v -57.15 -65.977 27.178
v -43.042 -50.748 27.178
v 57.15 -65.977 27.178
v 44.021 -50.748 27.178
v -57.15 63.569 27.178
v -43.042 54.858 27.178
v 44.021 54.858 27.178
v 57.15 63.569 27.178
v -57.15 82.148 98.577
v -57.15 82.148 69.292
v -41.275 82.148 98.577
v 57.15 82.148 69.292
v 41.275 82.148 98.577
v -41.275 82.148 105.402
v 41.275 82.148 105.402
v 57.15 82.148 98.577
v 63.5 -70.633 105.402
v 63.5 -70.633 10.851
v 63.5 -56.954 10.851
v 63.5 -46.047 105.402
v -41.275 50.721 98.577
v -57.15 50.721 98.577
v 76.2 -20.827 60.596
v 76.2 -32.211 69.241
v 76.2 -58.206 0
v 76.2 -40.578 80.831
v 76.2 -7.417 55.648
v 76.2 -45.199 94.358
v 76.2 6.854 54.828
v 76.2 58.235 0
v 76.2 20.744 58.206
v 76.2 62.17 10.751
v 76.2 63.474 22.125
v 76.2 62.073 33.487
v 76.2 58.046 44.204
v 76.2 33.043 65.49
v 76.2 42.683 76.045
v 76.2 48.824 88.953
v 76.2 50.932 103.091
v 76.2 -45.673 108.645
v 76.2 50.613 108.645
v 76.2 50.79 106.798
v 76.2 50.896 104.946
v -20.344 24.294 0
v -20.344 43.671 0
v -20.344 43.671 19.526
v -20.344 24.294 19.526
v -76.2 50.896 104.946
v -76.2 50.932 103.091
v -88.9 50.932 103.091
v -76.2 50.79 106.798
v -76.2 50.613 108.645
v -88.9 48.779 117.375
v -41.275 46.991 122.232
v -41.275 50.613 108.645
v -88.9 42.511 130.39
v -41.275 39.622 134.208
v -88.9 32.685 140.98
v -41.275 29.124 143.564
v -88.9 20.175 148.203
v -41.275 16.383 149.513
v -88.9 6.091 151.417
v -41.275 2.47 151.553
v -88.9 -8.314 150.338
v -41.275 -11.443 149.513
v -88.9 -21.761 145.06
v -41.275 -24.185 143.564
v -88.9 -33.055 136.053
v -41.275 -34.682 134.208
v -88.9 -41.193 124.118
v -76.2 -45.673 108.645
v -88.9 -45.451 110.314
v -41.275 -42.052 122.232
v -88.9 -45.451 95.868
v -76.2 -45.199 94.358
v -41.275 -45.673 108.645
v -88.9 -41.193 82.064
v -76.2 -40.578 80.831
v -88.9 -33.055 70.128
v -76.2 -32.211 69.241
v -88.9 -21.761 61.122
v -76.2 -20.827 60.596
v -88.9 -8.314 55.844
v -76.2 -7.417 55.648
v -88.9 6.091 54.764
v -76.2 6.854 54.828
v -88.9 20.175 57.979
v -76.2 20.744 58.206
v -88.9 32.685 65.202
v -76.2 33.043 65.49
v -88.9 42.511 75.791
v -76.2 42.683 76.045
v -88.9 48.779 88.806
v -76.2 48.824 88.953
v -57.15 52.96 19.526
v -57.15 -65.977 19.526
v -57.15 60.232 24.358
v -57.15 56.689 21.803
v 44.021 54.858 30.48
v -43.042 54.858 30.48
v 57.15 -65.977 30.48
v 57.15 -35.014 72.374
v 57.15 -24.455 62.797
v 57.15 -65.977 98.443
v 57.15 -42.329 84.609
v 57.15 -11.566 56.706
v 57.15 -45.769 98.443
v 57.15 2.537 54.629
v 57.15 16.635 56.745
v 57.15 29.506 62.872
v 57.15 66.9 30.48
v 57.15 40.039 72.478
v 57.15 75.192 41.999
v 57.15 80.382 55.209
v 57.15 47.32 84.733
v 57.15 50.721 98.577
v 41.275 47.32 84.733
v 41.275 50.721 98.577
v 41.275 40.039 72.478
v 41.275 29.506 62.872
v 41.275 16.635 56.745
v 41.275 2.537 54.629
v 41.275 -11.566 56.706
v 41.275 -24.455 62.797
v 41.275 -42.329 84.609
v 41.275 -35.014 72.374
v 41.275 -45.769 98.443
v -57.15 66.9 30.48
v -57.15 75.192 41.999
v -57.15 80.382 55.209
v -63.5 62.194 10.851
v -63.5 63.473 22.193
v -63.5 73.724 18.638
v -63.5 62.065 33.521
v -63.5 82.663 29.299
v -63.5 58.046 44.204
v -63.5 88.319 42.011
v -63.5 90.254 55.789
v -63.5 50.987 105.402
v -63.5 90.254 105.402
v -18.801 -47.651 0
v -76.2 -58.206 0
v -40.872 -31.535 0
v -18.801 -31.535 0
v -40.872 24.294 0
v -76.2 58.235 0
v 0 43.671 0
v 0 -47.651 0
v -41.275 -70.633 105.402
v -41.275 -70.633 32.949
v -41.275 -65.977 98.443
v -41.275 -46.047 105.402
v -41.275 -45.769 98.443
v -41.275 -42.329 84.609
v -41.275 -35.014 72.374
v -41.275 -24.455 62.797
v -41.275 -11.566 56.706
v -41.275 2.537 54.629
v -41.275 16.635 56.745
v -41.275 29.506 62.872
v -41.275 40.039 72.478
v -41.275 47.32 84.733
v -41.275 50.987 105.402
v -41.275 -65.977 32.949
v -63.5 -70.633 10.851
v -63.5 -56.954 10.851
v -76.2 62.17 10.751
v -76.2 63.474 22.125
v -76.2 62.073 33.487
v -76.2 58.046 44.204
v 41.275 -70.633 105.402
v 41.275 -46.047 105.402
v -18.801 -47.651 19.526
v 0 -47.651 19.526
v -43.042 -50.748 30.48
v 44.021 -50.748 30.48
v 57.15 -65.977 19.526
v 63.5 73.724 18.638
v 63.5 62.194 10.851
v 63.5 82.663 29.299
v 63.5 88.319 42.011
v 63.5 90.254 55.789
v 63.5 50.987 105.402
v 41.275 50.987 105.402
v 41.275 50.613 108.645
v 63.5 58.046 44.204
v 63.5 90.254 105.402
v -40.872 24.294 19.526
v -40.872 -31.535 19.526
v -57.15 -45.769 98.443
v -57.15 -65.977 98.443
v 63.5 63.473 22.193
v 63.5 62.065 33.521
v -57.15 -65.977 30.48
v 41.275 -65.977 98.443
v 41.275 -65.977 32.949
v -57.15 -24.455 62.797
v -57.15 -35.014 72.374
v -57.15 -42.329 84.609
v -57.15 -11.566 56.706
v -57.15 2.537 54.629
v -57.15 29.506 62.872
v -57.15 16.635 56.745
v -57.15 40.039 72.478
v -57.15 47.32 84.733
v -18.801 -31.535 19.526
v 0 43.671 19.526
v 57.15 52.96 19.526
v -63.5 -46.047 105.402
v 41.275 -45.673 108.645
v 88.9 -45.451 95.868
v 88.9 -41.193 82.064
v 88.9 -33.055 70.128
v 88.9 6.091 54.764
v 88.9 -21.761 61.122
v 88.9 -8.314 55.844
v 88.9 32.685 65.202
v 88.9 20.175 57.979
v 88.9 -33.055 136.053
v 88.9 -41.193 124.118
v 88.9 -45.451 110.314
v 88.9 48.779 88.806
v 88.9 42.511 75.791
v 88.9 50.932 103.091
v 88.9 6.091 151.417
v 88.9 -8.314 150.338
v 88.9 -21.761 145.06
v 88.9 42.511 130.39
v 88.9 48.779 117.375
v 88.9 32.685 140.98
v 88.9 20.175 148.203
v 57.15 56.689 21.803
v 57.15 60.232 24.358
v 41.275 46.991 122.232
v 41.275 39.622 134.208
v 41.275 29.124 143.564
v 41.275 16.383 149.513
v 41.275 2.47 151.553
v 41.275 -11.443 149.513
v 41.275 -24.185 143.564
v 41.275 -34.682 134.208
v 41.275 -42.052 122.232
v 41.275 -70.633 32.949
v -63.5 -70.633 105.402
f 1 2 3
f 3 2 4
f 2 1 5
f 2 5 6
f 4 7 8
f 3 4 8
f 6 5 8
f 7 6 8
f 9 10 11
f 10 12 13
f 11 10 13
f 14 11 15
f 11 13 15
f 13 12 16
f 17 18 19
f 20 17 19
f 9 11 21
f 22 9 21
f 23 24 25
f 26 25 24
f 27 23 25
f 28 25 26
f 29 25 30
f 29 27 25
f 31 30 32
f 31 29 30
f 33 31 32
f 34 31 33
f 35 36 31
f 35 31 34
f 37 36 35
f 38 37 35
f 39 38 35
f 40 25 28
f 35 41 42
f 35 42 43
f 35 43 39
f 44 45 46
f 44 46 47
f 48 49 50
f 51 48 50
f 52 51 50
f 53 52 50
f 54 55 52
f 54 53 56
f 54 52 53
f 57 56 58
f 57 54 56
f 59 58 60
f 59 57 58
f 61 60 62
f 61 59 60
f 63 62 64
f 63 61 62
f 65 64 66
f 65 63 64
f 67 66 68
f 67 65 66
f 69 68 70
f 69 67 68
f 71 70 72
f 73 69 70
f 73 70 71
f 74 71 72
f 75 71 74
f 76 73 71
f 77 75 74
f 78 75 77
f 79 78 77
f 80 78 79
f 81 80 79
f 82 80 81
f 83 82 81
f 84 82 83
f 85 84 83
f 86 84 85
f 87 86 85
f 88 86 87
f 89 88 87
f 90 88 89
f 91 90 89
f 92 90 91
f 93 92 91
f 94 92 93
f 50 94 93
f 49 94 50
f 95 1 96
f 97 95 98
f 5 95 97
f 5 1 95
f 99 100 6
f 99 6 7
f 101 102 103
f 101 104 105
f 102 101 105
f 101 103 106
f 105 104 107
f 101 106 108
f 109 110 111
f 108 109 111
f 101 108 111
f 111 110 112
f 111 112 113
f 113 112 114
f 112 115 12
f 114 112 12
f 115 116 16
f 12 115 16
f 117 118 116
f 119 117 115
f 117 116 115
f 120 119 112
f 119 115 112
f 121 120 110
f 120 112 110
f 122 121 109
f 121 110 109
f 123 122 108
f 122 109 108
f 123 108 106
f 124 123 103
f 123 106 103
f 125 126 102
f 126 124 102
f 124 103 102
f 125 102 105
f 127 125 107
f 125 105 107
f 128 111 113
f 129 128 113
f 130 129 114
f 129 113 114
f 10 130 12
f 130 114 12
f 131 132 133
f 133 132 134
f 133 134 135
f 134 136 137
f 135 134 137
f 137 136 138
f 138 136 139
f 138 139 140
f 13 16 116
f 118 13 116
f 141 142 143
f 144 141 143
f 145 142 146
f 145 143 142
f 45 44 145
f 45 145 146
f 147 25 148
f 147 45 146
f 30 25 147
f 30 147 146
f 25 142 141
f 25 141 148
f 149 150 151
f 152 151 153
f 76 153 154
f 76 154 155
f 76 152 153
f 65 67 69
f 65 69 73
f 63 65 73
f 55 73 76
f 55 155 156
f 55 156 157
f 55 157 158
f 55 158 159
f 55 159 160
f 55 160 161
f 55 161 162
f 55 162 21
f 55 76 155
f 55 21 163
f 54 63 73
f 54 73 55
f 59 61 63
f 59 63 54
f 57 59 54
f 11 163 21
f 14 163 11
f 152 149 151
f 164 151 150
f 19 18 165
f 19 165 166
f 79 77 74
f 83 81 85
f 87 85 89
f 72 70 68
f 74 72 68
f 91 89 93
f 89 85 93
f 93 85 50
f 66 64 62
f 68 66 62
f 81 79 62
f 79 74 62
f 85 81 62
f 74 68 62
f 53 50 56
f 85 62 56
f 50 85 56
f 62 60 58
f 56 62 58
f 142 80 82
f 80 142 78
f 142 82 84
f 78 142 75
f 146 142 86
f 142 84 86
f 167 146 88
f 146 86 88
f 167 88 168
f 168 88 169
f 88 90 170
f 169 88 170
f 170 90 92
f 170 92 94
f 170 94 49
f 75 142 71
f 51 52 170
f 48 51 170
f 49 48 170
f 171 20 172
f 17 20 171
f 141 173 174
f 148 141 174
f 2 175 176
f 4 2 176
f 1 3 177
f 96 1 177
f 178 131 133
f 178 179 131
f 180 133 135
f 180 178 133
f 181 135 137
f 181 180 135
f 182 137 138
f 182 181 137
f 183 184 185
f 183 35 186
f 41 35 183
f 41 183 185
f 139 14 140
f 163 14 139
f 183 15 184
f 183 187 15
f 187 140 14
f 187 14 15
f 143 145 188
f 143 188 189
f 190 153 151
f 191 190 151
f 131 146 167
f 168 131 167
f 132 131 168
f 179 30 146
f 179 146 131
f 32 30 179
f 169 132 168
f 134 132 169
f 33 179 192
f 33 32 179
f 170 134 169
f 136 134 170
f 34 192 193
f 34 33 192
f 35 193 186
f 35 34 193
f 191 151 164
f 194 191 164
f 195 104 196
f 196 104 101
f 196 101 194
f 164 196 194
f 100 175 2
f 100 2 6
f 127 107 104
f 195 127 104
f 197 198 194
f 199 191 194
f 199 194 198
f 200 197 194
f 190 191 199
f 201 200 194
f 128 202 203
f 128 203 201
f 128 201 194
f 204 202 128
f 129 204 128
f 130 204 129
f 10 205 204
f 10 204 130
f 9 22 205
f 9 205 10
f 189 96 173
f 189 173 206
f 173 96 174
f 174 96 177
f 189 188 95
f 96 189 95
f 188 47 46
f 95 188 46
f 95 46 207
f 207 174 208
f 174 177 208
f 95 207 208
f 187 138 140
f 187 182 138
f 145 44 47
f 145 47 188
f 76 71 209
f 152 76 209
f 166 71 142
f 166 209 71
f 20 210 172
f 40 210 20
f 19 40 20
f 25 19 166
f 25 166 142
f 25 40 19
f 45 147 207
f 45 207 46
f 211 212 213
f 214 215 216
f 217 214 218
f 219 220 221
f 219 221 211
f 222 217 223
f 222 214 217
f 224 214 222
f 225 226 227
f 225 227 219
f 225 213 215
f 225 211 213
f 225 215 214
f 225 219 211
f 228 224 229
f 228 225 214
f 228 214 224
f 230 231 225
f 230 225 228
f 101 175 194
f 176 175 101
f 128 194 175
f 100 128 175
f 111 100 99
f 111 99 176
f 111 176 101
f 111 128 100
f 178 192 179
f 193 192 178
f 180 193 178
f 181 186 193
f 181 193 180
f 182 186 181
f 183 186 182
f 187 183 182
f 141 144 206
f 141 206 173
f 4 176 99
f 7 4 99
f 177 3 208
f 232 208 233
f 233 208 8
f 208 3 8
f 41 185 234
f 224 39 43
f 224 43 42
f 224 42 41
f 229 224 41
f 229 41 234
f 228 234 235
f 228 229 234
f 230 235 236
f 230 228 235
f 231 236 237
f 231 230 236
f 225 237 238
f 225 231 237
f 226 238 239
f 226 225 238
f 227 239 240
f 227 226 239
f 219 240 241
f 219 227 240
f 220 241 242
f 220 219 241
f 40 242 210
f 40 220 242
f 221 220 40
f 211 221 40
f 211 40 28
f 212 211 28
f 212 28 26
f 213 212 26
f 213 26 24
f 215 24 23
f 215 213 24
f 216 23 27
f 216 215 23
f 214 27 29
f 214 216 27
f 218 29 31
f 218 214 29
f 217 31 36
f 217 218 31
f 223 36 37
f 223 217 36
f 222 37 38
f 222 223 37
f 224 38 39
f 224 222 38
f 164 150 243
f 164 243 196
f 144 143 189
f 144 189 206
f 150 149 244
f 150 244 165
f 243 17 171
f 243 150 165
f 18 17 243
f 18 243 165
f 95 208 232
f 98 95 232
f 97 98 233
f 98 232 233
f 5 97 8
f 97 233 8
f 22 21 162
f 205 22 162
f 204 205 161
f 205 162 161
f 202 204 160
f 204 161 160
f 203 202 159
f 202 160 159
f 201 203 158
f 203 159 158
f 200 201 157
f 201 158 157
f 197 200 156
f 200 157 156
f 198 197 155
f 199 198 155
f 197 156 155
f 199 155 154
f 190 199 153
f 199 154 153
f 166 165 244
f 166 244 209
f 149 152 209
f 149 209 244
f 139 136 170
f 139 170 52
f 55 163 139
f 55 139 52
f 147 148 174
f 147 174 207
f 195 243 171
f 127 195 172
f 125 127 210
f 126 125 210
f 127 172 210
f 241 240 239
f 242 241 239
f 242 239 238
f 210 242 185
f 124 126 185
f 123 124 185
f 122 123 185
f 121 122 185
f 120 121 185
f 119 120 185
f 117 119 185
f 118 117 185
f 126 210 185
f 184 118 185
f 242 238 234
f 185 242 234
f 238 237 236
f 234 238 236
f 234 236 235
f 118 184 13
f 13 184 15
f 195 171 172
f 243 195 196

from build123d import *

# Parameters (mm, degrees)
F1_DEPTH  = 76.2
F2_R      = 48.462003
F3_DEPTH  = 88.9
F5_DEPTH  = 63.5
F7_DEPTH  = 41.275
F9_DEPTH  = 57.15
F11_W     = 122.617453
F11_H     = 143.214412
F11_W_2   = 87.062612
F11_H_2   = 105.60561
F12_DEPTH = 3.302
F14_DEPTH = 25.4


with BuildPart() as f1:
    # F0 (on Right) → F1 (new body, symmetric)
    with BuildSketch(Plane.YZ):
        with BuildLine():
            Line((-45.672867, 108.644605), (-58.206145, 0))
            Line((-58.206145, 0), (58.235409, 0))
            ThreePointArc((58.235409, 0), (63.473631, 22.12486), (58.046448, 44.204128))
            Line((58.046448, 44.204128), (50.612573, 108.644605))
            ThreePointArc((50.612573, 108.644605), (2.469853, 151.552848), (-45.672867, 108.644605))
        make_face()
    extrude(amount=F1_DEPTH, both=True)

    # F2 (on Right) → F3 (join, symmetric)
    with BuildSketch(Plane.YZ):
        with Locations((2.469853, 103.090845)):
            Circle(F2_R)
    extrude(amount=F3_DEPTH, both=True)

    # F4 (on Right) → F5 (join, symmetric)
    with BuildSketch(Plane.YZ):
        with BuildLine():
            Line((90.254351, 105.402268), (-70.632874, 105.402268))
            Line((-70.632874, 105.402268), (-70.632874, 10.851024))
            Line((-70.632874, 10.851024), (62.193779, 10.851024))
            ThreePointArc((62.193779, 10.851024), (82.663095, 29.299382), (90.254351, 55.789147))
            Line((90.254351, 55.789147), (90.254351, 105.402268))
        make_face()
    extrude(amount=F5_DEPTH, both=True)

    # F6 (on Right) → F7 (cut, symmetric)
    with BuildSketch(Plane.YZ):
        with BuildLine():
            Line((82.148224, 166.311592), (-101.252101, 166.311592))
            Line((-101.252101, 166.311592), (-101.252101, 32.949033))
            Line((-101.252101, 32.949033), (-65.976813, 32.949033))
            Line((-65.976813, 32.949033), (-65.976813, 19.525689))
            Line((-65.976813, 19.525689), (52.960247, 19.525689))
            ThreePointArc((52.960247, 19.525689), (74.312895, 40.444956), (82.148224, 69.292121))
            Line((82.148224, 69.292121), (82.148224, 166.311592))
        make_face()
    extrude(amount=F7_DEPTH, both=True, mode=Mode.SUBTRACT)

    # F8 (on Right) → F9 (cut, symmetric)
    with BuildSketch(Plane.YZ):
        with BuildLine():
            ThreePointArc((50.721201, 98.577179), (2.53727, 54.628888), (-45.76875, 98.442949))
            Line((-45.76875, 98.442949), (-65.976813, 98.442949))
            Line((-65.976813, 98.442949), (-65.976813, 19.525689))
            Line((-65.976813, 19.525689), (52.960247, 19.525689))
            ThreePointArc((52.960247, 19.525689), (74.312895, 40.444956), (82.148224, 69.292121))
            Line((82.148224, 69.292121), (82.148224, 98.577179))
            Line((82.148224, 98.577179), (50.721201, 98.577179))
        make_face()
    extrude(amount=F9_DEPTH, both=True, mode=Mode.SUBTRACT)

    # F11 (on offset) → F12 (join)
    with BuildSketch(Plane.XY.offset(30.48)):
        with Locations((-0.147897, 3.422026)):
            Rectangle(F11_W, F11_H)
        with Locations((0.489652, 2.055012)):
            Rectangle(F11_W_2, F11_H_2, mode=Mode.SUBTRACT)
    extrude(amount=-F12_DEPTH)

    # F13 (on Top) → F14 (cut)
    with BuildSketch(Plane.XY):
        Polygon((-40.871959, 24.293846), (-40.871959, -31.535055), (-18.801486, -31.535055), (-18.801486, -47.650613), (0, -47.650613), (0, 43.670883), (-20.343806, 43.670883), (-20.343806, 24.293846), align=None)
    extrude(amount=F14_DEPTH, mode=Mode.SUBTRACT)


solid = f1.part
